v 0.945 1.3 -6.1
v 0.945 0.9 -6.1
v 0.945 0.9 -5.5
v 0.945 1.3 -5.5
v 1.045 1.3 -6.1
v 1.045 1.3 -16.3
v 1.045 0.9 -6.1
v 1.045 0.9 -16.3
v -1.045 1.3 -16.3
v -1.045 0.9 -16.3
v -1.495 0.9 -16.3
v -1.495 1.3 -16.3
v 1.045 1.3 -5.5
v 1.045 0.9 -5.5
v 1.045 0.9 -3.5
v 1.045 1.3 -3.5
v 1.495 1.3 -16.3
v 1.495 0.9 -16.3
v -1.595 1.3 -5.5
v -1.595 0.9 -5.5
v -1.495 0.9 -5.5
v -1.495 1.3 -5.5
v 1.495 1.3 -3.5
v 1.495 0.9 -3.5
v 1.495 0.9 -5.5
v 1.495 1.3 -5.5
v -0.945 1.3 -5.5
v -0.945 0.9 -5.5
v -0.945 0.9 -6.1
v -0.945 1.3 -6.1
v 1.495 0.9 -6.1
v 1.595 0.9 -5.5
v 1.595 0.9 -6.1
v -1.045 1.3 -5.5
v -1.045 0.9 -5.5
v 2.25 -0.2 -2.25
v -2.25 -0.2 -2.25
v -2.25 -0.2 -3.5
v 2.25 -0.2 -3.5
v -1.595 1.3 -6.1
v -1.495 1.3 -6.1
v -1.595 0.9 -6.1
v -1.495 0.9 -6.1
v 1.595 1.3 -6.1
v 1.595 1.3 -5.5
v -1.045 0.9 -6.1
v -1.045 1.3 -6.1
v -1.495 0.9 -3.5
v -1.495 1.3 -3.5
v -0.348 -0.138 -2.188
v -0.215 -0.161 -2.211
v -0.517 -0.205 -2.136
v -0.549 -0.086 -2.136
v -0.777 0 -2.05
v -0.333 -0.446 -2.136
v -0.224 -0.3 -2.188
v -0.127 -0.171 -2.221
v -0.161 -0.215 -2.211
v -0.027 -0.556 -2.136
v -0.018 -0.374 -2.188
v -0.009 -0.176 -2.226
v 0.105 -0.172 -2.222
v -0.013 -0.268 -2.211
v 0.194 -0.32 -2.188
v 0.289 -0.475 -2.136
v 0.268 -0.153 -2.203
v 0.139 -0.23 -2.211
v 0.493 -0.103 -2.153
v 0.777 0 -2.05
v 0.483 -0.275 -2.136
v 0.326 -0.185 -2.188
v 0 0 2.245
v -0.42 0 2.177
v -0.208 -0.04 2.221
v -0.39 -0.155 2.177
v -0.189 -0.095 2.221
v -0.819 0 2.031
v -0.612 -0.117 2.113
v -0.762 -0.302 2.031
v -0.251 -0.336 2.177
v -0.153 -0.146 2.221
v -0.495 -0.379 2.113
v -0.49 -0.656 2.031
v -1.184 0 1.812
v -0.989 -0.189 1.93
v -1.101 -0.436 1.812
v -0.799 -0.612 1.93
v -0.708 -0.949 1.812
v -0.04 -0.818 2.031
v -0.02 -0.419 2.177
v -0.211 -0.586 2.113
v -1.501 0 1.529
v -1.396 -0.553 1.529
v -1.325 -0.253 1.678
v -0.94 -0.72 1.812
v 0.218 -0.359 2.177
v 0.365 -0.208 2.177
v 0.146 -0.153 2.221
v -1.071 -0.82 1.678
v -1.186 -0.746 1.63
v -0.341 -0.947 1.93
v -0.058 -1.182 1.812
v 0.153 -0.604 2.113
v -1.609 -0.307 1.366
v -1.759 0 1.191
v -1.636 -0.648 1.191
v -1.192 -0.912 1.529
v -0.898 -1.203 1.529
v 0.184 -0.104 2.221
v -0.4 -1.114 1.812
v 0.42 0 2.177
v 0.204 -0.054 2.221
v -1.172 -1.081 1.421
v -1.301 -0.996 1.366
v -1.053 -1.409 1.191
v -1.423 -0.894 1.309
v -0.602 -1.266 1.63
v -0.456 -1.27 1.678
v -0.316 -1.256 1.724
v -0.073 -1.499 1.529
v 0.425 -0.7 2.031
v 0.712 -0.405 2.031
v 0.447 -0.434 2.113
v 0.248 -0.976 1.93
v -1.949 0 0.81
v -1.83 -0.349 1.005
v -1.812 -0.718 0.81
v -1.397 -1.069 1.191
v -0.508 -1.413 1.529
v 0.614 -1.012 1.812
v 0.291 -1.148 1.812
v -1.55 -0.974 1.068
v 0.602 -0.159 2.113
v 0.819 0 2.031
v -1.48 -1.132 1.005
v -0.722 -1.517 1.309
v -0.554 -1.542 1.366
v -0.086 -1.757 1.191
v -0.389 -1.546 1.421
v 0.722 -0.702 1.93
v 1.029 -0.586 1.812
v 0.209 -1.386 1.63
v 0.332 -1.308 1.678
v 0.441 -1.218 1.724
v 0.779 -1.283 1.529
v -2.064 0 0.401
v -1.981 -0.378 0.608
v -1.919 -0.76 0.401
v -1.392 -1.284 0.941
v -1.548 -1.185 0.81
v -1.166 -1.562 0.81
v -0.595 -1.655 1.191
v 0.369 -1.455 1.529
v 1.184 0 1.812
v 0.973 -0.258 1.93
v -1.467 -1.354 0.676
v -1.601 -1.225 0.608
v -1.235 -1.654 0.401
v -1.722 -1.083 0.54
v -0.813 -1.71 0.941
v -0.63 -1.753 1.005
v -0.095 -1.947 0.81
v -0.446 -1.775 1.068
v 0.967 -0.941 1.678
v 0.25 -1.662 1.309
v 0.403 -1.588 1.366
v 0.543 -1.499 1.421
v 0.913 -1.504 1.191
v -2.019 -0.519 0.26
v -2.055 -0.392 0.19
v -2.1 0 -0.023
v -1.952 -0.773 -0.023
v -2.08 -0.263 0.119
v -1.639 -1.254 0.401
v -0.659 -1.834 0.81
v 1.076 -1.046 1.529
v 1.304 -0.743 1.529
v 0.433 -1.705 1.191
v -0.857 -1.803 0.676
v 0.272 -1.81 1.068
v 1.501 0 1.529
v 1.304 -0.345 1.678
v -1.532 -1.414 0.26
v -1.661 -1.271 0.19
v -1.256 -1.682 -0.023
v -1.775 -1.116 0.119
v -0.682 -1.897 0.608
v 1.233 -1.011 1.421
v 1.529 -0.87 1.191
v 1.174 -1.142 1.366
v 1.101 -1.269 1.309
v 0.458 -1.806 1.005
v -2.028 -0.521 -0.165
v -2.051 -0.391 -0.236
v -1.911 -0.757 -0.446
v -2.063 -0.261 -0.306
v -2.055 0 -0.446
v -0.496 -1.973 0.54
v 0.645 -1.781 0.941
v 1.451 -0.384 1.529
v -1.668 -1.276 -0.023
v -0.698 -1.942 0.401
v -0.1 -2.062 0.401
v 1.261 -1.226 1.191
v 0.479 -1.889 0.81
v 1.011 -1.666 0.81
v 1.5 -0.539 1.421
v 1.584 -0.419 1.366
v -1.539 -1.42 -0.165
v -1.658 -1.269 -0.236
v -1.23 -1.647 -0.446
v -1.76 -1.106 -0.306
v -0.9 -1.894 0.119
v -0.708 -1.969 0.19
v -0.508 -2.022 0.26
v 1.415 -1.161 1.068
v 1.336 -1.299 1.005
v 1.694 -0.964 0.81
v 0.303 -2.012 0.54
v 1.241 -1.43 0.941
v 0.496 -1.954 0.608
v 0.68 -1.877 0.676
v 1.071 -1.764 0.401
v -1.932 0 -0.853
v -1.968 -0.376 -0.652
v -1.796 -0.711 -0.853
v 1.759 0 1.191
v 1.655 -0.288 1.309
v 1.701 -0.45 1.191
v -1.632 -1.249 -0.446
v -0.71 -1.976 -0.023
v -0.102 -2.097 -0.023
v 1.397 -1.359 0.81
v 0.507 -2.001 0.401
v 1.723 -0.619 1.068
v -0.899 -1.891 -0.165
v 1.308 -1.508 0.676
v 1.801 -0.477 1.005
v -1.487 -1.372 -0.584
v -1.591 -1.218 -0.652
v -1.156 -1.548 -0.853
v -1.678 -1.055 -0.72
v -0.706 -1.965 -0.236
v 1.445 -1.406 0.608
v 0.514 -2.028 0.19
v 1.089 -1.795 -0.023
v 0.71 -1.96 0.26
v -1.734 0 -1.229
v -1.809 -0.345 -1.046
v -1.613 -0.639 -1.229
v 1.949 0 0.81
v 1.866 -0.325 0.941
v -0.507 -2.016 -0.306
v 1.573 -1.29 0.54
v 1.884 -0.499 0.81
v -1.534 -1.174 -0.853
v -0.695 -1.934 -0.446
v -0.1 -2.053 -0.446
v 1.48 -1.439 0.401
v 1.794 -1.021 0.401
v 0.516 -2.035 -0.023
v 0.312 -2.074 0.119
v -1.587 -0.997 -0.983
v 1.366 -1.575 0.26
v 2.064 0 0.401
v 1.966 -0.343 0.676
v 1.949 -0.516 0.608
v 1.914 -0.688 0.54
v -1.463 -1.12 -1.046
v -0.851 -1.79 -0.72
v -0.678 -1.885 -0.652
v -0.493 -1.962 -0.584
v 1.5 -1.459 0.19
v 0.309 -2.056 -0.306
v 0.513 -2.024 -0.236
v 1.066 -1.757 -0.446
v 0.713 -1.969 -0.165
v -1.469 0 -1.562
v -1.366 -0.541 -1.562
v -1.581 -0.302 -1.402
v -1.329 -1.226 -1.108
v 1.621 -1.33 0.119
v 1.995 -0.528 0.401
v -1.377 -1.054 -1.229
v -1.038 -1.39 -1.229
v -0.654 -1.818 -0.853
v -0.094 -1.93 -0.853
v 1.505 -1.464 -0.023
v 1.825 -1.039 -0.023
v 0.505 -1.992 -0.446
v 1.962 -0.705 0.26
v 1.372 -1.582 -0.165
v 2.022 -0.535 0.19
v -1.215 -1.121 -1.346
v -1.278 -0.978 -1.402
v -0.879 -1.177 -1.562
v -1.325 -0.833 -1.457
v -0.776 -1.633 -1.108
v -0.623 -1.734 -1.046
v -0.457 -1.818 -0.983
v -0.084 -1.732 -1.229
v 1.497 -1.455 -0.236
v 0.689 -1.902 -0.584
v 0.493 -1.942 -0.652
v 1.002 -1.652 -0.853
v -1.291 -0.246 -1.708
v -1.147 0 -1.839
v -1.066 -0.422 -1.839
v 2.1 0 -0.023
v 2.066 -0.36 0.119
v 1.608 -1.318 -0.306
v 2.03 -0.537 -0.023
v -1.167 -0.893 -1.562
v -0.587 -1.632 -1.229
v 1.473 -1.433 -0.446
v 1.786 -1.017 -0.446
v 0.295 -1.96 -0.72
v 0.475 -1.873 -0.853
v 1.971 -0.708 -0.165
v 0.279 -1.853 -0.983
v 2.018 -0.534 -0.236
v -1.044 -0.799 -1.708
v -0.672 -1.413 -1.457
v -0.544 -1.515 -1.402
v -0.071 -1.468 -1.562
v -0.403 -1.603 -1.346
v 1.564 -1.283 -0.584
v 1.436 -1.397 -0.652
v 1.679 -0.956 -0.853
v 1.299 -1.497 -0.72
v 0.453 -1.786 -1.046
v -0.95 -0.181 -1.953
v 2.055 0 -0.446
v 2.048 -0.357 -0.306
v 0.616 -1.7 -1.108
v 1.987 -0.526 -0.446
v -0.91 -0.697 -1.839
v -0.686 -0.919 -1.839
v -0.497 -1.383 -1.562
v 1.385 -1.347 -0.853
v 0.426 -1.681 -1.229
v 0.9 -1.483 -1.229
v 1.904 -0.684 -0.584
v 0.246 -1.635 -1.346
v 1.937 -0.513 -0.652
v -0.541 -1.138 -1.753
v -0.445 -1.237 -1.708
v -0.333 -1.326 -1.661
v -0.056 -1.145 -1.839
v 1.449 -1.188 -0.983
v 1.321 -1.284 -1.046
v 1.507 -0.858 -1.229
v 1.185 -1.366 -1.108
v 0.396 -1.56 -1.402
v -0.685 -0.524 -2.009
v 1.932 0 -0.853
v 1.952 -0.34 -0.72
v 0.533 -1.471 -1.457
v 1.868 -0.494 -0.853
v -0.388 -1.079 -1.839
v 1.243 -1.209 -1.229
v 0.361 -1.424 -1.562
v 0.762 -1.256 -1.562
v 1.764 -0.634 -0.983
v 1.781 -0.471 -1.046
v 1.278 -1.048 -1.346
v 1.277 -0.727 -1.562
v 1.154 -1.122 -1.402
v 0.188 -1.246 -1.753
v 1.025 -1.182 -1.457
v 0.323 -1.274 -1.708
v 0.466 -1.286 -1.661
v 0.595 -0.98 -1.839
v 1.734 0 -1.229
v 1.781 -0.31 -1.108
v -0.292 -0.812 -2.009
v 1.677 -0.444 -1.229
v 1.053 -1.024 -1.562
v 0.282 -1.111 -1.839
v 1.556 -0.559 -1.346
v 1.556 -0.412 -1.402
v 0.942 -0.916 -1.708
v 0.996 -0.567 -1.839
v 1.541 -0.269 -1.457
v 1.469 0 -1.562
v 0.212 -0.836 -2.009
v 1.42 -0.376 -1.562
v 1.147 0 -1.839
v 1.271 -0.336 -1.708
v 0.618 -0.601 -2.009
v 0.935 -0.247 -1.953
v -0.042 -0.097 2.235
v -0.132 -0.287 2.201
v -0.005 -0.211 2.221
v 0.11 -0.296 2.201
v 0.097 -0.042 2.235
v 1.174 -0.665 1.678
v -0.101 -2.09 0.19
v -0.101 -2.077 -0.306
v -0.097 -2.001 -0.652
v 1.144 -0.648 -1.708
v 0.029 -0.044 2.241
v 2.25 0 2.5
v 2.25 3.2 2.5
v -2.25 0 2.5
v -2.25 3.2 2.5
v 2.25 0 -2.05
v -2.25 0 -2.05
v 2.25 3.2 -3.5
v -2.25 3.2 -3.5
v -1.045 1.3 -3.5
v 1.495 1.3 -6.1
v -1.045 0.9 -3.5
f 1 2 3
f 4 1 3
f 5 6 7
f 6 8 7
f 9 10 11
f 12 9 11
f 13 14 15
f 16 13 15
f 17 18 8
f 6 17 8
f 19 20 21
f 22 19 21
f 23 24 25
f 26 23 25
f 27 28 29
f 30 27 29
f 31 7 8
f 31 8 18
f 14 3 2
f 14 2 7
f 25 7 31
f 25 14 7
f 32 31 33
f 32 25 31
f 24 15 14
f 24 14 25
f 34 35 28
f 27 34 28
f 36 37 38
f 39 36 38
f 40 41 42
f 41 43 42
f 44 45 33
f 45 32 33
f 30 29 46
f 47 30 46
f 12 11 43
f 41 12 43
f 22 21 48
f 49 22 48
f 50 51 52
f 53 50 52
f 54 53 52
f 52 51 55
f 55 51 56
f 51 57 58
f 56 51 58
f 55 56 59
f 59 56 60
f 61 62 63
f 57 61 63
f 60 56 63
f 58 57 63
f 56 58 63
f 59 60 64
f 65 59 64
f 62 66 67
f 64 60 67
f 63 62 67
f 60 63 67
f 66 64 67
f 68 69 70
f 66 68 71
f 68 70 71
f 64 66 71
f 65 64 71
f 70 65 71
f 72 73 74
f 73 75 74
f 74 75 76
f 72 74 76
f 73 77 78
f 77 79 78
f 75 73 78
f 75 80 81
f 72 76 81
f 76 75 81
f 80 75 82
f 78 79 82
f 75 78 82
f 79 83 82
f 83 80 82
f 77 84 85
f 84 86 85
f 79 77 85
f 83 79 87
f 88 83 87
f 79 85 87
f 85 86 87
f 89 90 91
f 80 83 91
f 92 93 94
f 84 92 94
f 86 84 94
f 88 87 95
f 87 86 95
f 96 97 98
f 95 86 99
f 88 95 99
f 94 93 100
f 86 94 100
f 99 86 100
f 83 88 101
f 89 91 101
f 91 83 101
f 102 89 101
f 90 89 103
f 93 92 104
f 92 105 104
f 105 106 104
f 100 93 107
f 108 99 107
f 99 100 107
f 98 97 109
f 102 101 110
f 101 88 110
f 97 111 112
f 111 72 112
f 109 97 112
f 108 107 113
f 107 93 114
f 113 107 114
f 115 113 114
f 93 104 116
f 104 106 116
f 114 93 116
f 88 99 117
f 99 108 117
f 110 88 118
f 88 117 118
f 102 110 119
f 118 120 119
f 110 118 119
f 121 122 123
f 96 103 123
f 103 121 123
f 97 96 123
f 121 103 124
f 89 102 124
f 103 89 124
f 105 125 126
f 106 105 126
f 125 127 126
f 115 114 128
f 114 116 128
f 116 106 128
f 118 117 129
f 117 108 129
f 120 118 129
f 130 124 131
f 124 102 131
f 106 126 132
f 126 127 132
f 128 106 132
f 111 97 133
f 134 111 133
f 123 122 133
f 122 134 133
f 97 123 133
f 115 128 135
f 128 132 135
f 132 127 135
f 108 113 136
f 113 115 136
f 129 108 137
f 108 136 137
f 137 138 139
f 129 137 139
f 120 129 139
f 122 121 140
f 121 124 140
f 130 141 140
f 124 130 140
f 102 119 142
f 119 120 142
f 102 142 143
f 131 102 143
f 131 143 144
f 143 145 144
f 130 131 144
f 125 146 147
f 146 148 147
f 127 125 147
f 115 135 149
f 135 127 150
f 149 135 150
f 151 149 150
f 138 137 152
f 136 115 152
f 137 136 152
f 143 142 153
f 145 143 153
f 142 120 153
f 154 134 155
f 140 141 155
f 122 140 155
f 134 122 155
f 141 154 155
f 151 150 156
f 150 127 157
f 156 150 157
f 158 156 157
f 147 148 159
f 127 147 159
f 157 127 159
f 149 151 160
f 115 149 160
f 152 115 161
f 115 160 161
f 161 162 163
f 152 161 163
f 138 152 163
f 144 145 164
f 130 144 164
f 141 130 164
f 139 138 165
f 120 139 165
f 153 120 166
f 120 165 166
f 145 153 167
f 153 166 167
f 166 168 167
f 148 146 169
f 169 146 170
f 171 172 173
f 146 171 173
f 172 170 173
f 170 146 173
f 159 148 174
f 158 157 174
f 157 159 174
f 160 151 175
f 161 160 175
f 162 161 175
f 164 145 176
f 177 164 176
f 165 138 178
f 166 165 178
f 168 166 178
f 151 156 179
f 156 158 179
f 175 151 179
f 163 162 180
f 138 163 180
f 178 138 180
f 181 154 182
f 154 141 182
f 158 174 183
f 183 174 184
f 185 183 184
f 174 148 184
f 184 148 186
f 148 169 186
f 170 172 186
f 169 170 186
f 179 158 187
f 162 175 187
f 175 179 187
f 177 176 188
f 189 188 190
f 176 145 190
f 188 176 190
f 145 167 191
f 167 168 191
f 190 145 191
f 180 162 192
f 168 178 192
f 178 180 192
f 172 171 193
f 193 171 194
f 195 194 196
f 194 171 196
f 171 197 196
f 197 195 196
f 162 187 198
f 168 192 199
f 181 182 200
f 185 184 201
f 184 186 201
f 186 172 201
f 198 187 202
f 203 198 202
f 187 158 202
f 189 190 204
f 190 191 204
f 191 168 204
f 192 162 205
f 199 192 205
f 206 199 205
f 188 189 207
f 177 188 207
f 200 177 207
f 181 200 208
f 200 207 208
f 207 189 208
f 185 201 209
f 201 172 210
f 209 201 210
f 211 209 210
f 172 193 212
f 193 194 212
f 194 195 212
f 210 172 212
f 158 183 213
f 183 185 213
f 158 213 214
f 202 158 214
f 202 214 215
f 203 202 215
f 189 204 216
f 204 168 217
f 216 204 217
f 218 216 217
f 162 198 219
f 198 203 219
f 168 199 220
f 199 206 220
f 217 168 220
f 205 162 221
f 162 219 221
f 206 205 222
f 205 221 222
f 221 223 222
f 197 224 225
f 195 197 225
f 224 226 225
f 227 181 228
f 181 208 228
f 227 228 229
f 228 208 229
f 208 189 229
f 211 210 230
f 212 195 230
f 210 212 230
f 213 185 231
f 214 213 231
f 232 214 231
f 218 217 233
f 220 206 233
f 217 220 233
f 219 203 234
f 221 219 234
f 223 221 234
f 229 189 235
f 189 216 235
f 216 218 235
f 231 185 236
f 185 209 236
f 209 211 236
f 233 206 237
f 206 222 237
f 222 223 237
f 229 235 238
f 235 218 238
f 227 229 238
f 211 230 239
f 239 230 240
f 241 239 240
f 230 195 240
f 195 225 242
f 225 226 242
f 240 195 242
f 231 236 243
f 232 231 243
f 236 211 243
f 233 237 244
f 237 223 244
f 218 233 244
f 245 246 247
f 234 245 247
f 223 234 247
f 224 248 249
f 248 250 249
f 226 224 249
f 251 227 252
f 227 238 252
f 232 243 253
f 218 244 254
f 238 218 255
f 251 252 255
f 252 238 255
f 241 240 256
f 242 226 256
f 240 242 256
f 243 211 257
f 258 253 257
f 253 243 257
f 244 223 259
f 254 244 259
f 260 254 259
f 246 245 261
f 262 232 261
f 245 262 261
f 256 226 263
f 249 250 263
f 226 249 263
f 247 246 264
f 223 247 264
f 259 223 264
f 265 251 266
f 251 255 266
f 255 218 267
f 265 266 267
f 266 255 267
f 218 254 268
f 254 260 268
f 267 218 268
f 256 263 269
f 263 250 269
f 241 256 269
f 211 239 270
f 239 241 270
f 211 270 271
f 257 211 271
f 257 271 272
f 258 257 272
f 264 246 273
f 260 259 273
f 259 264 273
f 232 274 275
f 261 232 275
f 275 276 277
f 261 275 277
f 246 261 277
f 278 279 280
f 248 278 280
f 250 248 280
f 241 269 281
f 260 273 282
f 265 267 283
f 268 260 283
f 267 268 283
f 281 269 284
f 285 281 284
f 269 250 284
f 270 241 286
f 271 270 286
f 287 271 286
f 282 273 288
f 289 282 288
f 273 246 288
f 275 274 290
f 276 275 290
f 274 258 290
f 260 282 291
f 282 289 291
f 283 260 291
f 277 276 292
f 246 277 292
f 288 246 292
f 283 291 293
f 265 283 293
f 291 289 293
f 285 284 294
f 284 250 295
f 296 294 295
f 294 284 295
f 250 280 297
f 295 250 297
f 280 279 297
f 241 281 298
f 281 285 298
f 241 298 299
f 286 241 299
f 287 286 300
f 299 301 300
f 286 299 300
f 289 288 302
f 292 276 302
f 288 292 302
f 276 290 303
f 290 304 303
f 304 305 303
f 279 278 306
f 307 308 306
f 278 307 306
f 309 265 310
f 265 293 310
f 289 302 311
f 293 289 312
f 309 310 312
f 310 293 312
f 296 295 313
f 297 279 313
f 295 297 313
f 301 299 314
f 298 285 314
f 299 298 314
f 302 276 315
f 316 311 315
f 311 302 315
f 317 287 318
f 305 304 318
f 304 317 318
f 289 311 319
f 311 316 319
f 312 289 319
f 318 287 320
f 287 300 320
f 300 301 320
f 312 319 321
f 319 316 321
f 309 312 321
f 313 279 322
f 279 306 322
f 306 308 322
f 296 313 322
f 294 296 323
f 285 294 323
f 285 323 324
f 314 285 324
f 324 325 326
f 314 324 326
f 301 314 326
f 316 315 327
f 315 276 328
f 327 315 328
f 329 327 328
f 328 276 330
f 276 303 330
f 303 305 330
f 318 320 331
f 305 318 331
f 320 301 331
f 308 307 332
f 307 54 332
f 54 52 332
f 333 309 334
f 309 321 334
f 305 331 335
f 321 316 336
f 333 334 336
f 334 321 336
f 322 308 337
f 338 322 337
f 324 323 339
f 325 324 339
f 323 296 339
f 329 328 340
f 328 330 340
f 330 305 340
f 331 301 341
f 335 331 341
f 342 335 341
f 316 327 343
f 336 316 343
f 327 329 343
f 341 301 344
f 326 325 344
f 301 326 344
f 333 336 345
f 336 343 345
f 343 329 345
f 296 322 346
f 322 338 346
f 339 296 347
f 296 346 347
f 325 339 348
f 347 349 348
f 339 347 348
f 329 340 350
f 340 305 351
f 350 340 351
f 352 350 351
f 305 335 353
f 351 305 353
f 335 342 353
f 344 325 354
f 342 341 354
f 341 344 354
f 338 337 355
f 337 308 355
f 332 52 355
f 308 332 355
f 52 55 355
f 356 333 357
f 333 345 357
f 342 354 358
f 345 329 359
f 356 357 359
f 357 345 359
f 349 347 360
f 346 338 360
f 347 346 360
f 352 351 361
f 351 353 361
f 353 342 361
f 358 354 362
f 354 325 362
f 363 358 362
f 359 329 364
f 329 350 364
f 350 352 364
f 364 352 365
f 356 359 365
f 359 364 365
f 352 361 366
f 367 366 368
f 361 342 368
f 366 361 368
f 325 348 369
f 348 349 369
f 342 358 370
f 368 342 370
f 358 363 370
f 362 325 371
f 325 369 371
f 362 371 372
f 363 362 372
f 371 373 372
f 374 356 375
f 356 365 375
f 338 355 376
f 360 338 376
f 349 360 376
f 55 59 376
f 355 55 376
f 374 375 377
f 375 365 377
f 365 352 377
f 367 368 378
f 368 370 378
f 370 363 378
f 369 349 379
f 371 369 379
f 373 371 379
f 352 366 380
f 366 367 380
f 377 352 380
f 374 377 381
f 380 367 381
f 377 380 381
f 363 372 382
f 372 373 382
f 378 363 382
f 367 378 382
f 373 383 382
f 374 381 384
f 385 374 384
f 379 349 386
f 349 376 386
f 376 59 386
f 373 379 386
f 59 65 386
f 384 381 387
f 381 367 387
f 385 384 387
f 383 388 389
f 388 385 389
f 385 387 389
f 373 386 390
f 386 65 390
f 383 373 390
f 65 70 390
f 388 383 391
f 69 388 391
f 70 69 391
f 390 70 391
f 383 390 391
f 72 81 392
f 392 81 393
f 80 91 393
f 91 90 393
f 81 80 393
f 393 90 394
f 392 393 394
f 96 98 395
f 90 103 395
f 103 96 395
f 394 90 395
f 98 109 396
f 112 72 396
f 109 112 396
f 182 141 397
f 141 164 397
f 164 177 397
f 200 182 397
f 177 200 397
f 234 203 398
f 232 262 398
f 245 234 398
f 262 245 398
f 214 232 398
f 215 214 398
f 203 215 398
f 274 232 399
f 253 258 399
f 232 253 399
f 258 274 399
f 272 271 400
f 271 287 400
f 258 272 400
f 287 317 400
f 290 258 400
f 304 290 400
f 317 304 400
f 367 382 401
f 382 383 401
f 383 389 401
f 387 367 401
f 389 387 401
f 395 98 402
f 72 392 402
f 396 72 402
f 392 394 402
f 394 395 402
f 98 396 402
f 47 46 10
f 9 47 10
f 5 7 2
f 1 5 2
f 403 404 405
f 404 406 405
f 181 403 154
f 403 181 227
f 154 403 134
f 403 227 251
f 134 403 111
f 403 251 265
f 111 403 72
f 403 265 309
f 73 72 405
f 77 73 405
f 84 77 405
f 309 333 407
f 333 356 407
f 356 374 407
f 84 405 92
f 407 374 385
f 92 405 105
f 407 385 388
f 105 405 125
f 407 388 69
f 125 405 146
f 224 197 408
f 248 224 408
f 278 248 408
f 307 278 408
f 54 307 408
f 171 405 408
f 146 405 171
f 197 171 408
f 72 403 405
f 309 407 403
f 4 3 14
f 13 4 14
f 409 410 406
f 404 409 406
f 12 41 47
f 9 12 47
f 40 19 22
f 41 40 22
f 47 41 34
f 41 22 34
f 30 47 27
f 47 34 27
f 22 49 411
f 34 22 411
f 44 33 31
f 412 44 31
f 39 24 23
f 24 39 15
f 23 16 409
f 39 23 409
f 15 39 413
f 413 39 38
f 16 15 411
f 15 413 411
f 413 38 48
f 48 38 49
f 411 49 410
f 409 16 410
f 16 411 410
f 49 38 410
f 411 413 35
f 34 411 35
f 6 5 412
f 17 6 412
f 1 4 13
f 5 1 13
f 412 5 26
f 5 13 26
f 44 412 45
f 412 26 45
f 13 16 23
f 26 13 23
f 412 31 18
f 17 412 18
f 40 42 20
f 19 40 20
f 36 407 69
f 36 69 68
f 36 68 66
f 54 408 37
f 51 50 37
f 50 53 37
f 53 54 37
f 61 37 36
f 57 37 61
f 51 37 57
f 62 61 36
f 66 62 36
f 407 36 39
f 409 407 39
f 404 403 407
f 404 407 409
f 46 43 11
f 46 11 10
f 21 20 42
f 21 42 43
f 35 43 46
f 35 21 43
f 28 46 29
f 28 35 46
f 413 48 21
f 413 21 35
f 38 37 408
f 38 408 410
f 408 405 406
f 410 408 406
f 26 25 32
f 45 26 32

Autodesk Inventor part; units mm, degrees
ref_plane "YZ Plane" through (0, 0, 0) normal (1, 0, 0) x (0, 1, 0)
ref_plane "XZ Plane" through (0, 0, 0) normal (0, 1, 0) x (-1, 0, 0)
sketch "Skizze3" plane through (0, 0, 0) normal (1, 0, 0) x (0, 1, 0)
  line L0 (3.2, 2.5) -> (0, 2.5)
  line L1 (0, 2.5) -> (0, -2.05)
  line L2 (0, -2.05) -> (-0.2, -2.25)
  line L3 (-0.2, -2.25) -> (-0.2, -3.5)
  line L4 (-0.2, -3.5) -> (3.2, -3.5)
  line L5 (3.2, -3.5) -> (3.2, 2.5)
  line L6 (0, 3.7) -> (0, -4.7) projected
  line L7 (-0.88, 0) -> (3.88, 0) projected
  point P0 (0, 0)
  dimension "d5" = 3.2
  dimension "d6" = 6
  dimension "d7" = 2.5
  dimension "d8" = 3.4
  dimension "d9" = 45
  dimension "d10" = 4.55
extrude "Extrusion2" add sketch "Skizze3" along normal mid plane 4.5
sketch "Skizze4" plane through (0, 0, 0) normal (1, 0, 0) x (0, 1, 0)
  line L0 (0, -2.05) -> (0, 2.5) projected
  arc A0 (0, 2.245) -> (0, -2.245) centre (0.15, 0) ccw
  line L1 (3.2, 2.5) -> (0, 2.5) projected
  line L2 (0, 2.245) -> (0, -2.245)
  point P0 (0, 0)
  dimension "d13" = 2.25
  dimension "d14" = 0.15
  dimension "d15" = 2.5
revolve "Umdrehung1" add sketch "Skizze4" angle 180 mid plane about axis through (0, 0, -2.05) along (0, 0, 1)
ref_plane "Arbeitsebene1" through (-2.25, 0.9, -3.5) normal (0, -1, 0) x (1, 0, 0)
sketch "Skizze5" plane through (-2.25, 0.9, -3.5) normal (0, -1, 0) x (1, 0, 0)
  line L0 (0.755, 0) -> (1.205, 0)
  line L1 (1.205, -12.8) -> (0.755, -12.8)
  line L2 (0, 0) -> (4.5, 0) projected
  line L3 (1.305, -2) -> (1.305, -2.6)
  line L4 (0.655, -2.6) -> (0.655, -2)
  line L5 (0.655, -2) -> (0.755, -2)
  line L6 (1.205, -2) -> (1.305, -2)
  line L7 (1.305, -2.6) -> (1.205, -2.6)
  line L8 (0.755, -2.6) -> (0.655, -2.6)
  line L9 (0.755, -12.8) -> (0.755, -2.6)
  line L10 (0.755, -2) -> (0.755, 0)
  line L11 (1.205, 0) -> (1.205, -2)
  line L12 (1.205, -2.6) -> (1.205, -12.8)
  line L13 (0.98, -12.8) -> (0.98, 0) construction
  line L14 (4.5, 6) -> (0, 6) construction
  point P0 (2.25, 3.5)
  dimension "d18" = 0.45
  dimension "d19" = 0.65
  dimension "d20" = 0.6
  dimension "d21" = 8.6
  dimension "d22" = 18.8
  dimension "d23" = 1.27
extrude "Extrusion3" add sketch "Skizze5" against normal blind 0.4
mirror "Spiegeln1" about plane through (0, 0, 0) normal (1, 0, 0) of "Extrusion3"
properties part number "Fotodiode BPV23F"
